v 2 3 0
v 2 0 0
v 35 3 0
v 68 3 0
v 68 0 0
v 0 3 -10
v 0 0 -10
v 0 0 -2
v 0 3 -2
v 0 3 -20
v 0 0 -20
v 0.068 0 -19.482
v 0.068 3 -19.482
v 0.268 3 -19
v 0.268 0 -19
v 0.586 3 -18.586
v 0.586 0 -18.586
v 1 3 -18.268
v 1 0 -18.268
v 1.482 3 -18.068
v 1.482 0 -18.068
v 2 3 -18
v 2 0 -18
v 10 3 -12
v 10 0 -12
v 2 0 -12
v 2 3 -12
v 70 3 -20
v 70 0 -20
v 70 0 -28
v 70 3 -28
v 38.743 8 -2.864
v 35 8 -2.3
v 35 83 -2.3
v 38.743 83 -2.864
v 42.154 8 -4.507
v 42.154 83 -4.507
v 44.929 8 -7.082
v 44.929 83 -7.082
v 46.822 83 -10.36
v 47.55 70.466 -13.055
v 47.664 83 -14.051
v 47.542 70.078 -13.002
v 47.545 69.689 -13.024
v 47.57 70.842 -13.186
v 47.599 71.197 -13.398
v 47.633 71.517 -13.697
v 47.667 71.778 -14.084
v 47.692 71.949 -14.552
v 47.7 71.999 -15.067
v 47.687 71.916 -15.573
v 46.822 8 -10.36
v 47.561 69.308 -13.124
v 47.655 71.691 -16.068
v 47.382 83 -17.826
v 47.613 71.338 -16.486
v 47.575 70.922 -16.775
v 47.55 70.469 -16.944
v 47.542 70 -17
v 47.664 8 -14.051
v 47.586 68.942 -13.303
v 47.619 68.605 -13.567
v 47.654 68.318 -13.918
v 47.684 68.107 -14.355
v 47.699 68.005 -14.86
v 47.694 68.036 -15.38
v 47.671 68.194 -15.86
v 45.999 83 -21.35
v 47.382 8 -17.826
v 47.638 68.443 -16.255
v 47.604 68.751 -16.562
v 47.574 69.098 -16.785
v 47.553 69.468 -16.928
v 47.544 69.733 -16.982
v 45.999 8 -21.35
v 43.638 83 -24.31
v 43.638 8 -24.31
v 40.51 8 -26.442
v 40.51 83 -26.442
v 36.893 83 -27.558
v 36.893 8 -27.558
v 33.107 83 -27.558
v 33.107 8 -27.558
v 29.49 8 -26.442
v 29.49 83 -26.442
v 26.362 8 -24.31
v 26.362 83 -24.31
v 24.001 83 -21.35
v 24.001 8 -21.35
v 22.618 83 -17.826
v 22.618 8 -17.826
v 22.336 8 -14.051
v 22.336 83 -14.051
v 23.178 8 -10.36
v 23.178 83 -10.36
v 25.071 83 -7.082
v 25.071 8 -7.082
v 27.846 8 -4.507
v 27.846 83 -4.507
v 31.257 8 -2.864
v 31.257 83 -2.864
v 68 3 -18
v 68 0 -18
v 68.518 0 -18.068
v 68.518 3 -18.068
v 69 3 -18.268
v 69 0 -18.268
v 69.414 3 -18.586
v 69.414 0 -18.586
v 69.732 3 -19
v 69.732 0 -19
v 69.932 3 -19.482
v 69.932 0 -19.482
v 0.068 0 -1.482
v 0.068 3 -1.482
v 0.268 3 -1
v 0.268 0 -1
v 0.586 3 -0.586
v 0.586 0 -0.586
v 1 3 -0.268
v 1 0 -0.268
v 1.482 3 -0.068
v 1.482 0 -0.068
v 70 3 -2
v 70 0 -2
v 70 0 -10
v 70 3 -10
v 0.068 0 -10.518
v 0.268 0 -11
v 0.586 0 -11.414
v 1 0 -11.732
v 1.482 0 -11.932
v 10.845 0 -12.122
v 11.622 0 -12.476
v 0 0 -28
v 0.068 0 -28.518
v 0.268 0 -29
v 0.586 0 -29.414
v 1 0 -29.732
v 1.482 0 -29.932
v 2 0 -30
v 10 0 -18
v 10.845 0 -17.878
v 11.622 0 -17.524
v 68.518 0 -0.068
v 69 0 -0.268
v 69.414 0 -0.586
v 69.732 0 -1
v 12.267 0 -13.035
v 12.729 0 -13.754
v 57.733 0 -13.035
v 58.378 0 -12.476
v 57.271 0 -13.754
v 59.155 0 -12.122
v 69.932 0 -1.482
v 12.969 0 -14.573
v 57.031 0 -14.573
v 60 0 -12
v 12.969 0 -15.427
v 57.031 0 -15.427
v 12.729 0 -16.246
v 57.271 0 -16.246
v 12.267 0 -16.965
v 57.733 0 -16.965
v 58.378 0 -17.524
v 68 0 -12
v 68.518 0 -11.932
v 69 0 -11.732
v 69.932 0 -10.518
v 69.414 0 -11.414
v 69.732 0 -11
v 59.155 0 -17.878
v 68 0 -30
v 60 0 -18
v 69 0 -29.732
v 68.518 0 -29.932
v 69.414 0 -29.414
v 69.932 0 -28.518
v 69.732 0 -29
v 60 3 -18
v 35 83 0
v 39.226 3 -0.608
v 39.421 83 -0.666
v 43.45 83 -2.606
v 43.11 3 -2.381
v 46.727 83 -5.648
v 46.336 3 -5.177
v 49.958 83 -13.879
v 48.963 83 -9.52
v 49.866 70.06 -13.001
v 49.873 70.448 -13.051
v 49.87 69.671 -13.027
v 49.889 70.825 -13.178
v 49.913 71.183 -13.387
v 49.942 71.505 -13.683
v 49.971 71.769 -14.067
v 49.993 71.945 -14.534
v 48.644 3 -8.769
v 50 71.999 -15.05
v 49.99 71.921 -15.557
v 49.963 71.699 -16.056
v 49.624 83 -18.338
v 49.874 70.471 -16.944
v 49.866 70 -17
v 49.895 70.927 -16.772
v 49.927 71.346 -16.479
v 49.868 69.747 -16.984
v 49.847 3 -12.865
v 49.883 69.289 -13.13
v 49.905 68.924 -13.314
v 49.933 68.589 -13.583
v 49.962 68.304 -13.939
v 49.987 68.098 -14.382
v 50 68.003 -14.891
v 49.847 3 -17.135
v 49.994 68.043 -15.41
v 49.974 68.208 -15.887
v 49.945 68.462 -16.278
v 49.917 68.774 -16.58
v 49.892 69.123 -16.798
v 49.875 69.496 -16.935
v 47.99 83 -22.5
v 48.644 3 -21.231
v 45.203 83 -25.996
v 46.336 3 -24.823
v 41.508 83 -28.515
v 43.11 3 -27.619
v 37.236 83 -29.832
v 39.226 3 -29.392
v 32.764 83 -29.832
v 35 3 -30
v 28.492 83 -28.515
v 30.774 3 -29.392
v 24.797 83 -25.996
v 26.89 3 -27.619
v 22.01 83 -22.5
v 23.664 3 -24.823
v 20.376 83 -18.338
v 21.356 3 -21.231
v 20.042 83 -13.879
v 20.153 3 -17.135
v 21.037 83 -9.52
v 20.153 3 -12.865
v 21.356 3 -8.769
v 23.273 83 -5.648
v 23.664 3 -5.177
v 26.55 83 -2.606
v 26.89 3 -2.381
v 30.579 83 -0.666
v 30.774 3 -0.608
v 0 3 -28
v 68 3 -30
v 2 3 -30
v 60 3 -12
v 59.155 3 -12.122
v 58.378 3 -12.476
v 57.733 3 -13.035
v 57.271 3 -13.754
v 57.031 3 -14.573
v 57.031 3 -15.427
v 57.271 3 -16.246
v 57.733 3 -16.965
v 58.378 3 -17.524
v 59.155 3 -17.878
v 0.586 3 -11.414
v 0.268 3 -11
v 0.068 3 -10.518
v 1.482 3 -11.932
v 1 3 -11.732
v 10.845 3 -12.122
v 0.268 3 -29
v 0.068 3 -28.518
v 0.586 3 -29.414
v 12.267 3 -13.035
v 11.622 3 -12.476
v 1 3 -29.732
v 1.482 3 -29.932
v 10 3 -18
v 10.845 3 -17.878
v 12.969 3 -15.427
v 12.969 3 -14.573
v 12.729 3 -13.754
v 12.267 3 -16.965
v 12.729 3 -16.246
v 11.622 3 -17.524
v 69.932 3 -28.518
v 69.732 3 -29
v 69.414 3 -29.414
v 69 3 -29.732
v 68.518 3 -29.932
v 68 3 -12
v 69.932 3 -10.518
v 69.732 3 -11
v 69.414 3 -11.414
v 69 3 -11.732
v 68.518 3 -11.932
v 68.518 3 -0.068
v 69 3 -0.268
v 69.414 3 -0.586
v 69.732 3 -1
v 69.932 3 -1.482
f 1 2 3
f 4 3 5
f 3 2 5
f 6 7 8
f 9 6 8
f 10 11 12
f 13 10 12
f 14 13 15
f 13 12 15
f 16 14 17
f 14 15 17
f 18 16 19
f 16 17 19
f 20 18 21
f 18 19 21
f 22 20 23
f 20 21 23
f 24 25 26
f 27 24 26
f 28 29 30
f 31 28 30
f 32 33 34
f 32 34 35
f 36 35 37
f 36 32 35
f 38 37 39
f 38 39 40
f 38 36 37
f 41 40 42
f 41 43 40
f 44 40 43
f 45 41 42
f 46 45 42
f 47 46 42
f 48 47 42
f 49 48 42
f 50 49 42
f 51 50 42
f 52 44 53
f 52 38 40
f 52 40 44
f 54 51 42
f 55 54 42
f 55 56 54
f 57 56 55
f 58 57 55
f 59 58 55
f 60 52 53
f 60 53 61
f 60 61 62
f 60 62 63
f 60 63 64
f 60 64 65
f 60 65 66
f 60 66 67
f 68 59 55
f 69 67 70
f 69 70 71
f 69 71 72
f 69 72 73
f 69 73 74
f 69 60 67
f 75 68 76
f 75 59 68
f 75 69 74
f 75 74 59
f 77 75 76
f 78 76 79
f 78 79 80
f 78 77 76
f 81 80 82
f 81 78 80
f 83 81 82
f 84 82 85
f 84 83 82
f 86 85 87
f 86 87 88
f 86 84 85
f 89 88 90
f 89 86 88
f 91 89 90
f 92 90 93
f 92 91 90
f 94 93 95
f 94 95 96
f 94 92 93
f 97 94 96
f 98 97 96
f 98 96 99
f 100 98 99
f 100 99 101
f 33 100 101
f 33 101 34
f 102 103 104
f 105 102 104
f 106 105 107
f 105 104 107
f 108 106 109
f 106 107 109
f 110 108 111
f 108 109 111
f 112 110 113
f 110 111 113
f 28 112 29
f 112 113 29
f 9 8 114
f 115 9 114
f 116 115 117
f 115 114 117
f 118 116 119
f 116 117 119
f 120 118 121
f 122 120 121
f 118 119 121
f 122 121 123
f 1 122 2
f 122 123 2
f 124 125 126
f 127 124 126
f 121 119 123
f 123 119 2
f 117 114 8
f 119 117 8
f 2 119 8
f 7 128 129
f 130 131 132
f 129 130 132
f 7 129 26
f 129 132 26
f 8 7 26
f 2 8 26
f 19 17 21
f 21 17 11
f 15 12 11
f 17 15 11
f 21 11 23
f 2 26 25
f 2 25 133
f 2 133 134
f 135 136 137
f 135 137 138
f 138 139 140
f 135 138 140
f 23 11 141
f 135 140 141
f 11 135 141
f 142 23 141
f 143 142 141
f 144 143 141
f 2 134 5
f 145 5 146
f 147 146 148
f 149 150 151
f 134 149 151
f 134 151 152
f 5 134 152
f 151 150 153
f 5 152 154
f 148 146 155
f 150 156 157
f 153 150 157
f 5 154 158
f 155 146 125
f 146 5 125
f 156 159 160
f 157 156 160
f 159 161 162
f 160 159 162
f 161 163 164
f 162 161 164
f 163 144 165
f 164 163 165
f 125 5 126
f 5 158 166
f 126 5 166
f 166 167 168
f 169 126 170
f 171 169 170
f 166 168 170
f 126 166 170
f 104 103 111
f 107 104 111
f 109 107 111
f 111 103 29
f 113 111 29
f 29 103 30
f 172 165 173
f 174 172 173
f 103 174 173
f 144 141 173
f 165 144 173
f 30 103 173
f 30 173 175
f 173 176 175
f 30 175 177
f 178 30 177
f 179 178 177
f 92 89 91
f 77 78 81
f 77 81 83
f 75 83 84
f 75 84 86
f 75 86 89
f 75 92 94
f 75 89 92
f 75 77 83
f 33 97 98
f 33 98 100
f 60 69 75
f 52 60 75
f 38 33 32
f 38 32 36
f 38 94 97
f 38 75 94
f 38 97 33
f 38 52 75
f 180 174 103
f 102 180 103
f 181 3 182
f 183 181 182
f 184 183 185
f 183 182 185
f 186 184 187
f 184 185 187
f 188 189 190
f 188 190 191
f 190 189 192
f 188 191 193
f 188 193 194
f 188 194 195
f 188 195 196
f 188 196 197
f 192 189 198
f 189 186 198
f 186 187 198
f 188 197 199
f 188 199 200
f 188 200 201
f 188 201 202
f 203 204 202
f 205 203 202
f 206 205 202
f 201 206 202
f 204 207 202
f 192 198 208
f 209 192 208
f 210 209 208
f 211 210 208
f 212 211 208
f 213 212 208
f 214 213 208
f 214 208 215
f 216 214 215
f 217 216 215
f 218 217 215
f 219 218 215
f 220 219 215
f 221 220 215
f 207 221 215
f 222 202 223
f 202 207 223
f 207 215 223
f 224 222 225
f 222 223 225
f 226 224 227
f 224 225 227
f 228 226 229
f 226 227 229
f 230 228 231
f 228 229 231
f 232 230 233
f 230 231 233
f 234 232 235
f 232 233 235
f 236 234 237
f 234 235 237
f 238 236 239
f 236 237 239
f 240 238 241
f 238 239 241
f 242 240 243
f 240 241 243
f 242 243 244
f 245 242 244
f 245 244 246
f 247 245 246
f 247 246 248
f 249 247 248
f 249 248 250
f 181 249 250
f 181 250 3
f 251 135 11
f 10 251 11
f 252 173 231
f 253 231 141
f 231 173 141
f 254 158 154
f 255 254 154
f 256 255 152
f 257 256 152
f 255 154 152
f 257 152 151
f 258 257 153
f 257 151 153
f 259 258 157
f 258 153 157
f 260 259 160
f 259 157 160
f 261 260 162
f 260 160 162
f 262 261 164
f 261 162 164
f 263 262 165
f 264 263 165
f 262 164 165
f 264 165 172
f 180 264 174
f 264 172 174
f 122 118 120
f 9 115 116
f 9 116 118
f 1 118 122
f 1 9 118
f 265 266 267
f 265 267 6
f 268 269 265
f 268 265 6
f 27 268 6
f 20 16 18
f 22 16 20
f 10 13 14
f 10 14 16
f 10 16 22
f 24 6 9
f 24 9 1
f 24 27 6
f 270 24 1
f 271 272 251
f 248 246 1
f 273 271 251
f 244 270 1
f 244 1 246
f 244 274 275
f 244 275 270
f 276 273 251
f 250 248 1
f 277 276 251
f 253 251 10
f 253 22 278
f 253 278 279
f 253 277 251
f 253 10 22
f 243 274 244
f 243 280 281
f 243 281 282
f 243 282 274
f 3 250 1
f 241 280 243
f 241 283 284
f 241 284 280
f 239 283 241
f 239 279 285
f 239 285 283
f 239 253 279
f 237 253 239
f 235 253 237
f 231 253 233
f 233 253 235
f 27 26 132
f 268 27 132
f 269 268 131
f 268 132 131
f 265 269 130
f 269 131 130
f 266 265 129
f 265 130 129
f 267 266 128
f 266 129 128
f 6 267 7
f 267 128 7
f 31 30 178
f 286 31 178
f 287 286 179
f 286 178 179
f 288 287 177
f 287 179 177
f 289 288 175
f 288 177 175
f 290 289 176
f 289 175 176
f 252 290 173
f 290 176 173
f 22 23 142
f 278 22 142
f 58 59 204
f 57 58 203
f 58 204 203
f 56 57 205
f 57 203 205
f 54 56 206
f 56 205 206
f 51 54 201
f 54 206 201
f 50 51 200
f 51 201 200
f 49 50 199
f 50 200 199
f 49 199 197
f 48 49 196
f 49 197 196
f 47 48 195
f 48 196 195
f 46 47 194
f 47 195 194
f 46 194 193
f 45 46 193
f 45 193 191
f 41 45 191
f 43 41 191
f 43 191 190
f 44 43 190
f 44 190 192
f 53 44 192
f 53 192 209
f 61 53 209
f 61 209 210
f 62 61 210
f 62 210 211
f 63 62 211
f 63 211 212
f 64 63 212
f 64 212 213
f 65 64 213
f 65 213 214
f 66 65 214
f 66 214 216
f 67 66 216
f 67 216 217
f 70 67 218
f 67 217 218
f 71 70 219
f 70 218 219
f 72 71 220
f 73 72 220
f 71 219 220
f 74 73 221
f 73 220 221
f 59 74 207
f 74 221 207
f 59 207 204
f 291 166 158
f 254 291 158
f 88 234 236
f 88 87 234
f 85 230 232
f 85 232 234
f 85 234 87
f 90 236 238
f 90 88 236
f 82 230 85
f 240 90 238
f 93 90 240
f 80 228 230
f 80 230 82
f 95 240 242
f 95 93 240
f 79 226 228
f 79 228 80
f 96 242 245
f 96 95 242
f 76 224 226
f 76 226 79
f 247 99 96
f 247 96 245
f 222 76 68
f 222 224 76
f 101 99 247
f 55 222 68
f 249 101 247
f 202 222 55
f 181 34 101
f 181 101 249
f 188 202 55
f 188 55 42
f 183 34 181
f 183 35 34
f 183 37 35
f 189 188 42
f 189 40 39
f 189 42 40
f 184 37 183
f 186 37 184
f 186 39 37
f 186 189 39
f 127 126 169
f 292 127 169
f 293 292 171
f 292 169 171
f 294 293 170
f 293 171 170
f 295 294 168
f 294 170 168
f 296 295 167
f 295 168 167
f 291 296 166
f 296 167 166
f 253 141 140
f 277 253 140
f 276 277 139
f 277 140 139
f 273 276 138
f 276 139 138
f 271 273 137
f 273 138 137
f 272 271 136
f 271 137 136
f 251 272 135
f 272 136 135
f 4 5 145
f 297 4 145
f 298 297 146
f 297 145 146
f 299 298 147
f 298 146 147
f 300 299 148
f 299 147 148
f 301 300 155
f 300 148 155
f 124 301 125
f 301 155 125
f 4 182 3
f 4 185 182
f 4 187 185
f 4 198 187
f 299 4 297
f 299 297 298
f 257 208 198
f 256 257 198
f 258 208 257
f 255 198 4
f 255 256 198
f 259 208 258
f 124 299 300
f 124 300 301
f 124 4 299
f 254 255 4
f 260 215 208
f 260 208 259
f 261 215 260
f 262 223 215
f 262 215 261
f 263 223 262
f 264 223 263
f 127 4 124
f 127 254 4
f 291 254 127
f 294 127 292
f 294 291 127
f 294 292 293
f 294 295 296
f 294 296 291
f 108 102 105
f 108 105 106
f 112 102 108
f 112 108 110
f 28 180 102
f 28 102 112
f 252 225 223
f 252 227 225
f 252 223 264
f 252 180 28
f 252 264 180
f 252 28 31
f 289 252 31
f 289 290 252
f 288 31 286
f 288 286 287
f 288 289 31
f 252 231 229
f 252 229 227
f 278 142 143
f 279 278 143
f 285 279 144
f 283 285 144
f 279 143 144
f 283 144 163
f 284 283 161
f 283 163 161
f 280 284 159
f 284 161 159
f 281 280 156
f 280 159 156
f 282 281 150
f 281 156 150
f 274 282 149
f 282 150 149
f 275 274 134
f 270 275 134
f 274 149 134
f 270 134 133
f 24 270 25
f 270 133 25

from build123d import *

# Parameters (mm, degrees)
BOSS_EXTRUDE2_DEPTH = 3
SKETCH3_R           = 15
BOSS_EXTRUDE3_DEPTH = 5
SKETCH4_R           = 15
SKETCH4_R_2         = 12.7
BOSS_EXTRUDE5_DEPTH = 75
SKETCH5_R           = 2
CUT_EXTRUDE1_DEPTH  = 40


with BuildPart() as part:
    # Sketch1 → Boss-Extrude2 (new body)
    with BuildSketch(Plane(origin=(0, 0, 0), x_dir=(1, 0, 0), z_dir=(0, 1, 0))):
        with BuildLine():
            Line((2, 0), (68, 0))
            ThreePointArc((68, 0), (69.414213562, 0.585786438), (70, 2))
            Line((70, 2), (70, 10))
            ThreePointArc((70, 10), (69.414213562, 11.414213562), (68, 12))
            Line((68, 12), (60, 12))
            ThreePointArc((60, 12), (57, 15), (60, 18))
            Line((60, 18), (68, 18))
            ThreePointArc((68, 18), (69.414213562, 18.585786438), (70, 20))
            Line((70, 20), (70, 28))
            ThreePointArc((70, 28), (69.414213562, 29.414213562), (68, 30))
            Line((68, 30), (2, 30))
            ThreePointArc((2, 30), (0.585786438, 29.414213562), (0, 28))
            Line((0, 28), (0, 20))
            ThreePointArc((0, 20), (0.585786438, 18.585786438), (2, 18))
            Line((2, 18), (10, 18))
            ThreePointArc((10, 18), (13, 15), (10, 12))
            Line((10, 12), (2, 12))
            ThreePointArc((2, 12), (0.585786438, 11.414213562), (0, 10))
            Line((0, 10), (0, 2))
            ThreePointArc((0, 2), (0.585786438, 0.585786438), (2, 0))
        make_face()
    extrude(amount=BOSS_EXTRUDE2_DEPTH)

    # Sketch3 → Boss-Extrude3 (add)
    with BuildSketch(Plane(origin=(0, 3, 0), x_dir=(1, 0, 0), z_dir=(0, 1, 0))):
        with Locations(Location((35, 15, 0), (0, 0, 270))):
            Circle(SKETCH3_R)
    extrude(amount=BOSS_EXTRUDE3_DEPTH)

    # Sketch4 → Boss-Extrude5 (add)
    with BuildSketch(Plane(origin=(0, 8, 0), x_dir=(1, 0, 0), z_dir=(0, 1, 0))):
        with Locations(Location((35, 15, 0), (0, 0, 270))):
            Circle(SKETCH4_R)
        with Locations(Location((35, 15, 0), (0, 0, 270))):
            Circle(SKETCH4_R_2, mode=Mode.SUBTRACT)
    extrude(amount=BOSS_EXTRUDE5_DEPTH)

    # Sketch5 → Cut-Extrude1 (cut)
    with BuildSketch(Plane(origin=(70, 0, 0), x_dir=(0, 0, -1), z_dir=(1, 0, 0))):
        with Locations((15, 70)):
            Circle(SKETCH5_R)
    extrude(amount=-CUT_EXTRUDE1_DEPTH, mode=Mode.SUBTRACT)


solid = part.part
